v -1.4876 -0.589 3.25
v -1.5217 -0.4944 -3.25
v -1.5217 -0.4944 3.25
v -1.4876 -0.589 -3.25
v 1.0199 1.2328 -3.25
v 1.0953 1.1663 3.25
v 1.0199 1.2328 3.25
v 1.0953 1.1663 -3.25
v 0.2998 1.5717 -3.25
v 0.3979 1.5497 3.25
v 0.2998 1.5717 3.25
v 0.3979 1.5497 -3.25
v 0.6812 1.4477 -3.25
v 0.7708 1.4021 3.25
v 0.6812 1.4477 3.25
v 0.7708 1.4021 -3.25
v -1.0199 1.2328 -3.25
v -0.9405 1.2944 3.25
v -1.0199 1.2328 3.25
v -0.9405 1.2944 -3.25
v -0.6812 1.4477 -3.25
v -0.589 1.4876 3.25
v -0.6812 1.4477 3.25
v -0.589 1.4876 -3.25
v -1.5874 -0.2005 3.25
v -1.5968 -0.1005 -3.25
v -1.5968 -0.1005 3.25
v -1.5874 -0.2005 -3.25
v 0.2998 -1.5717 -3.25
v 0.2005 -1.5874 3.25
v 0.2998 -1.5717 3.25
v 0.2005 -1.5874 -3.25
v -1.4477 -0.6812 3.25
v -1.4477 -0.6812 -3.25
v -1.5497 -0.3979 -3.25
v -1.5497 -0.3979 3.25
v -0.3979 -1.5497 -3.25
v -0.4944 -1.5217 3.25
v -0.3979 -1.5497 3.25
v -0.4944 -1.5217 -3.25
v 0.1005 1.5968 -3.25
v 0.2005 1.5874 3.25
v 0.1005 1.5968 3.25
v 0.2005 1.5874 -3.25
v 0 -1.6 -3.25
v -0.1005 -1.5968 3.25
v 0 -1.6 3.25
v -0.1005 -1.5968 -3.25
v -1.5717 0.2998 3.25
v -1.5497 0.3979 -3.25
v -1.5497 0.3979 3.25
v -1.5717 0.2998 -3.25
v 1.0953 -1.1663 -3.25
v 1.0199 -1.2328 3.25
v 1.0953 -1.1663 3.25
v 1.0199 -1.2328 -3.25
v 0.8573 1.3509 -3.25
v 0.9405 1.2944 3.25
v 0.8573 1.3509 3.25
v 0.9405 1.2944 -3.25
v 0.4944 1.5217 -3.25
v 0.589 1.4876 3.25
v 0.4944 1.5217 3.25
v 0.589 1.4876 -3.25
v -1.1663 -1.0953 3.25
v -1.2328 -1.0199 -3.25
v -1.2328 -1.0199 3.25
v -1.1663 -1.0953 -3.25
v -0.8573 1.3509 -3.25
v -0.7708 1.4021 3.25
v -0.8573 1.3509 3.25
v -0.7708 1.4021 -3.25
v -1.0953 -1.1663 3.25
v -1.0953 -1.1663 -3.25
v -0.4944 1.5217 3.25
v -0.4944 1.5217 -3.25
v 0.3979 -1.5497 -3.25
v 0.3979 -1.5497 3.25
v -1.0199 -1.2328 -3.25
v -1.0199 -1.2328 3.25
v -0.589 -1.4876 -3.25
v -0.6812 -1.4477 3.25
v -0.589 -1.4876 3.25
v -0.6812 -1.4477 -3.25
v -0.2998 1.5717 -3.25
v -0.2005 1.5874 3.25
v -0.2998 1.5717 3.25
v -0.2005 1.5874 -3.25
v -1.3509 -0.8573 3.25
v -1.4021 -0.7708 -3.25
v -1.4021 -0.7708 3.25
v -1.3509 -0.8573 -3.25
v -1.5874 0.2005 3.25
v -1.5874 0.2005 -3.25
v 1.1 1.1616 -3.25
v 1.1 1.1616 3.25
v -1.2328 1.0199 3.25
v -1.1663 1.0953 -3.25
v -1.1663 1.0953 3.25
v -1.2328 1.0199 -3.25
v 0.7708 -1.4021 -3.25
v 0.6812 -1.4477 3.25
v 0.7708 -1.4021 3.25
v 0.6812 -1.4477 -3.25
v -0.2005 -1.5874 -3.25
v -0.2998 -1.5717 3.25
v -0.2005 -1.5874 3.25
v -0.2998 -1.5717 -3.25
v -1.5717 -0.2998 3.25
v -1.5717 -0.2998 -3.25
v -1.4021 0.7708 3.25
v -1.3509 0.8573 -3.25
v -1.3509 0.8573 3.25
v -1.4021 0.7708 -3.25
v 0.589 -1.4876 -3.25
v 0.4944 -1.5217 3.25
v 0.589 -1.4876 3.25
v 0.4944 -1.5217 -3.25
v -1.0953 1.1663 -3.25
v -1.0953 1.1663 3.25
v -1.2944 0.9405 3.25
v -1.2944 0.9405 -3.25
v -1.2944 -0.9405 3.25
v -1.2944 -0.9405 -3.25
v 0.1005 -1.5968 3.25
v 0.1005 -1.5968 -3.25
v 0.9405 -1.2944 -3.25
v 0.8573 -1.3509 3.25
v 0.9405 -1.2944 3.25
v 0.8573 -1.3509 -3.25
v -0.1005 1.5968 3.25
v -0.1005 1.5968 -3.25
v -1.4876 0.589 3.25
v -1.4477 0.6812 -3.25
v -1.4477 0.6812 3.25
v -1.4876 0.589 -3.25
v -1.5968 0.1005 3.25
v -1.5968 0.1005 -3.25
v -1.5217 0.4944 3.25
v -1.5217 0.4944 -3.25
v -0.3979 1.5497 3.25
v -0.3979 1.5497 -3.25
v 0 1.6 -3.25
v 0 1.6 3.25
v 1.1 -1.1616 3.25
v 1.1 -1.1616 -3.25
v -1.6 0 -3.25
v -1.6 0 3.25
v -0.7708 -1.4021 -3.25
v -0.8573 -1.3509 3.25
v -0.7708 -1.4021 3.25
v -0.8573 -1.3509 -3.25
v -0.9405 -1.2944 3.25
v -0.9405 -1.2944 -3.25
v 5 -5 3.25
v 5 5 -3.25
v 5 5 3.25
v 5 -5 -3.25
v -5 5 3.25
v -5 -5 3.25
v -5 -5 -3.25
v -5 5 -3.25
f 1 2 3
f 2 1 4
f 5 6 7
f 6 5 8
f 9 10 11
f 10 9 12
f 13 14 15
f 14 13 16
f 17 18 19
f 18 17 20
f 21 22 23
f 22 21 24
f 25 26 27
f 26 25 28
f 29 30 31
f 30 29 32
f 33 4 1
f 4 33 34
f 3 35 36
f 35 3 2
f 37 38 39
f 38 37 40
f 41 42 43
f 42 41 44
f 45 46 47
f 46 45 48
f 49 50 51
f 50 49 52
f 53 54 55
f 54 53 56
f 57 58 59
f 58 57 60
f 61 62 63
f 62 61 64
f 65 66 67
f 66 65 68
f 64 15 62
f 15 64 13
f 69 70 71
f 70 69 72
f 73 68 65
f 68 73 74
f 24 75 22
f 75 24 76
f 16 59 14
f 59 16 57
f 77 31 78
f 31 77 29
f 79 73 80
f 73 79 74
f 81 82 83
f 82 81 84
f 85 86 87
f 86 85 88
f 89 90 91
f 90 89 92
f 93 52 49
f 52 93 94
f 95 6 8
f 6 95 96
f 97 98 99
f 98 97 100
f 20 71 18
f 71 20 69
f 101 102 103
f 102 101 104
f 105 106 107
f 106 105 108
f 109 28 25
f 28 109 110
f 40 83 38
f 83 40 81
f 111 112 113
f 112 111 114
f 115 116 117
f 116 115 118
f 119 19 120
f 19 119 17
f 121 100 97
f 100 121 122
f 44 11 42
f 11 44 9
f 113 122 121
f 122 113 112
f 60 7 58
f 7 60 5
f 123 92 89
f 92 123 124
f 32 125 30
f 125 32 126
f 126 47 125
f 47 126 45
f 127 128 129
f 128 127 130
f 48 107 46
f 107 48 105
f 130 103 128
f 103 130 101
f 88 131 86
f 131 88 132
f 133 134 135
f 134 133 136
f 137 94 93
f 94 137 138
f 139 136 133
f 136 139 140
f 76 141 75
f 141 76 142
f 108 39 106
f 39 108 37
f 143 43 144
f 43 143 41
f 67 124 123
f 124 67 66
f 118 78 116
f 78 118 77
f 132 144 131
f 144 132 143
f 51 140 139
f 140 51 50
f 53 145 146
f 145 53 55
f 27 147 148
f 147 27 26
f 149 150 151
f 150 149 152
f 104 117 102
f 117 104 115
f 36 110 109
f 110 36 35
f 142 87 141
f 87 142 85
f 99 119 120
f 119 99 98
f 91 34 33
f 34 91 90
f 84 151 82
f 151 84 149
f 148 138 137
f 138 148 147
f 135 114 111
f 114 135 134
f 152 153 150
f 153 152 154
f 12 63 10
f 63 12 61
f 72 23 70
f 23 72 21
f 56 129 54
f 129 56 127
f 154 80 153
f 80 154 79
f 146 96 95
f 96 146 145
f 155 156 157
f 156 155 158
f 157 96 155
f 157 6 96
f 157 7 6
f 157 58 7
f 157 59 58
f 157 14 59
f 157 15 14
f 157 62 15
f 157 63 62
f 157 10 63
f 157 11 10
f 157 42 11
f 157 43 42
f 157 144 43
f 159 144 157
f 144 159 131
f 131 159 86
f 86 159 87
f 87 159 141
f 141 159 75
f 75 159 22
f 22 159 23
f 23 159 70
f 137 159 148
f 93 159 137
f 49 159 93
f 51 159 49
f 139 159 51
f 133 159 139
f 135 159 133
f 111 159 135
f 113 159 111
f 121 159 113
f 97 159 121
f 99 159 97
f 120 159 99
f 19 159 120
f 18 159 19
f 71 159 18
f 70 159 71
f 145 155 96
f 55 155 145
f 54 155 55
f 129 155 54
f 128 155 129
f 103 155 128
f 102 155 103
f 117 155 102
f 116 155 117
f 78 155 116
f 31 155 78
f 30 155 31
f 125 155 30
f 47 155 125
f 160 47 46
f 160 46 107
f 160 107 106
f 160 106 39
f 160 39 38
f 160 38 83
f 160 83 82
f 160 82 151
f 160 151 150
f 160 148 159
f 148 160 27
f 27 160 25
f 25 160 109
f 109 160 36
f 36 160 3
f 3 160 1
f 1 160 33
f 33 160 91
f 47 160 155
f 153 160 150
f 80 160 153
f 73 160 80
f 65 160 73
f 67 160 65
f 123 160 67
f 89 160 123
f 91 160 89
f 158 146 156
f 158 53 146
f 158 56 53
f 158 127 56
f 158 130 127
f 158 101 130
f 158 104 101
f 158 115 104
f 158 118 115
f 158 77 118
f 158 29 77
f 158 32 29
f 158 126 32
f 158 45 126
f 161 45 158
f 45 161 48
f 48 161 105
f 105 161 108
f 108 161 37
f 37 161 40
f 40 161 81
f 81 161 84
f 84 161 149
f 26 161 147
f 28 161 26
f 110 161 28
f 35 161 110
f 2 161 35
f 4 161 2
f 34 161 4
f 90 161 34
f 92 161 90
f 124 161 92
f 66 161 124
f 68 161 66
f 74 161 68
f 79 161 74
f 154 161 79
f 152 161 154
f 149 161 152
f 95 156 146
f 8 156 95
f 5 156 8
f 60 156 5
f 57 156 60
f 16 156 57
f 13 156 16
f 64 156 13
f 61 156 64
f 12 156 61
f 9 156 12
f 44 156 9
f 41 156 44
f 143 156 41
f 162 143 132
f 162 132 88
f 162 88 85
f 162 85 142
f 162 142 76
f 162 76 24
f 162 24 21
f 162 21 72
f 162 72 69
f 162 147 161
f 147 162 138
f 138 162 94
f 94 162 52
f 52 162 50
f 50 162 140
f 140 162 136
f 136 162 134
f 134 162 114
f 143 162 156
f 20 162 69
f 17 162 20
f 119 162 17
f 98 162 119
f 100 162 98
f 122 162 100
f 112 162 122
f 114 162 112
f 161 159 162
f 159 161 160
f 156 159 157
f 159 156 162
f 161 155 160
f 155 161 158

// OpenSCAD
$fn=100;

rad = 1.6;
hole = 1.1;

difference() {
	//Base
	cube([10,10,6.5], center=true);
	//Axel hole
	difference() {
		cylinder(r=rad, h=10, center=true);
		translate([hole, -5, -10])
			cube([10, 10, 20]);
	}
}
